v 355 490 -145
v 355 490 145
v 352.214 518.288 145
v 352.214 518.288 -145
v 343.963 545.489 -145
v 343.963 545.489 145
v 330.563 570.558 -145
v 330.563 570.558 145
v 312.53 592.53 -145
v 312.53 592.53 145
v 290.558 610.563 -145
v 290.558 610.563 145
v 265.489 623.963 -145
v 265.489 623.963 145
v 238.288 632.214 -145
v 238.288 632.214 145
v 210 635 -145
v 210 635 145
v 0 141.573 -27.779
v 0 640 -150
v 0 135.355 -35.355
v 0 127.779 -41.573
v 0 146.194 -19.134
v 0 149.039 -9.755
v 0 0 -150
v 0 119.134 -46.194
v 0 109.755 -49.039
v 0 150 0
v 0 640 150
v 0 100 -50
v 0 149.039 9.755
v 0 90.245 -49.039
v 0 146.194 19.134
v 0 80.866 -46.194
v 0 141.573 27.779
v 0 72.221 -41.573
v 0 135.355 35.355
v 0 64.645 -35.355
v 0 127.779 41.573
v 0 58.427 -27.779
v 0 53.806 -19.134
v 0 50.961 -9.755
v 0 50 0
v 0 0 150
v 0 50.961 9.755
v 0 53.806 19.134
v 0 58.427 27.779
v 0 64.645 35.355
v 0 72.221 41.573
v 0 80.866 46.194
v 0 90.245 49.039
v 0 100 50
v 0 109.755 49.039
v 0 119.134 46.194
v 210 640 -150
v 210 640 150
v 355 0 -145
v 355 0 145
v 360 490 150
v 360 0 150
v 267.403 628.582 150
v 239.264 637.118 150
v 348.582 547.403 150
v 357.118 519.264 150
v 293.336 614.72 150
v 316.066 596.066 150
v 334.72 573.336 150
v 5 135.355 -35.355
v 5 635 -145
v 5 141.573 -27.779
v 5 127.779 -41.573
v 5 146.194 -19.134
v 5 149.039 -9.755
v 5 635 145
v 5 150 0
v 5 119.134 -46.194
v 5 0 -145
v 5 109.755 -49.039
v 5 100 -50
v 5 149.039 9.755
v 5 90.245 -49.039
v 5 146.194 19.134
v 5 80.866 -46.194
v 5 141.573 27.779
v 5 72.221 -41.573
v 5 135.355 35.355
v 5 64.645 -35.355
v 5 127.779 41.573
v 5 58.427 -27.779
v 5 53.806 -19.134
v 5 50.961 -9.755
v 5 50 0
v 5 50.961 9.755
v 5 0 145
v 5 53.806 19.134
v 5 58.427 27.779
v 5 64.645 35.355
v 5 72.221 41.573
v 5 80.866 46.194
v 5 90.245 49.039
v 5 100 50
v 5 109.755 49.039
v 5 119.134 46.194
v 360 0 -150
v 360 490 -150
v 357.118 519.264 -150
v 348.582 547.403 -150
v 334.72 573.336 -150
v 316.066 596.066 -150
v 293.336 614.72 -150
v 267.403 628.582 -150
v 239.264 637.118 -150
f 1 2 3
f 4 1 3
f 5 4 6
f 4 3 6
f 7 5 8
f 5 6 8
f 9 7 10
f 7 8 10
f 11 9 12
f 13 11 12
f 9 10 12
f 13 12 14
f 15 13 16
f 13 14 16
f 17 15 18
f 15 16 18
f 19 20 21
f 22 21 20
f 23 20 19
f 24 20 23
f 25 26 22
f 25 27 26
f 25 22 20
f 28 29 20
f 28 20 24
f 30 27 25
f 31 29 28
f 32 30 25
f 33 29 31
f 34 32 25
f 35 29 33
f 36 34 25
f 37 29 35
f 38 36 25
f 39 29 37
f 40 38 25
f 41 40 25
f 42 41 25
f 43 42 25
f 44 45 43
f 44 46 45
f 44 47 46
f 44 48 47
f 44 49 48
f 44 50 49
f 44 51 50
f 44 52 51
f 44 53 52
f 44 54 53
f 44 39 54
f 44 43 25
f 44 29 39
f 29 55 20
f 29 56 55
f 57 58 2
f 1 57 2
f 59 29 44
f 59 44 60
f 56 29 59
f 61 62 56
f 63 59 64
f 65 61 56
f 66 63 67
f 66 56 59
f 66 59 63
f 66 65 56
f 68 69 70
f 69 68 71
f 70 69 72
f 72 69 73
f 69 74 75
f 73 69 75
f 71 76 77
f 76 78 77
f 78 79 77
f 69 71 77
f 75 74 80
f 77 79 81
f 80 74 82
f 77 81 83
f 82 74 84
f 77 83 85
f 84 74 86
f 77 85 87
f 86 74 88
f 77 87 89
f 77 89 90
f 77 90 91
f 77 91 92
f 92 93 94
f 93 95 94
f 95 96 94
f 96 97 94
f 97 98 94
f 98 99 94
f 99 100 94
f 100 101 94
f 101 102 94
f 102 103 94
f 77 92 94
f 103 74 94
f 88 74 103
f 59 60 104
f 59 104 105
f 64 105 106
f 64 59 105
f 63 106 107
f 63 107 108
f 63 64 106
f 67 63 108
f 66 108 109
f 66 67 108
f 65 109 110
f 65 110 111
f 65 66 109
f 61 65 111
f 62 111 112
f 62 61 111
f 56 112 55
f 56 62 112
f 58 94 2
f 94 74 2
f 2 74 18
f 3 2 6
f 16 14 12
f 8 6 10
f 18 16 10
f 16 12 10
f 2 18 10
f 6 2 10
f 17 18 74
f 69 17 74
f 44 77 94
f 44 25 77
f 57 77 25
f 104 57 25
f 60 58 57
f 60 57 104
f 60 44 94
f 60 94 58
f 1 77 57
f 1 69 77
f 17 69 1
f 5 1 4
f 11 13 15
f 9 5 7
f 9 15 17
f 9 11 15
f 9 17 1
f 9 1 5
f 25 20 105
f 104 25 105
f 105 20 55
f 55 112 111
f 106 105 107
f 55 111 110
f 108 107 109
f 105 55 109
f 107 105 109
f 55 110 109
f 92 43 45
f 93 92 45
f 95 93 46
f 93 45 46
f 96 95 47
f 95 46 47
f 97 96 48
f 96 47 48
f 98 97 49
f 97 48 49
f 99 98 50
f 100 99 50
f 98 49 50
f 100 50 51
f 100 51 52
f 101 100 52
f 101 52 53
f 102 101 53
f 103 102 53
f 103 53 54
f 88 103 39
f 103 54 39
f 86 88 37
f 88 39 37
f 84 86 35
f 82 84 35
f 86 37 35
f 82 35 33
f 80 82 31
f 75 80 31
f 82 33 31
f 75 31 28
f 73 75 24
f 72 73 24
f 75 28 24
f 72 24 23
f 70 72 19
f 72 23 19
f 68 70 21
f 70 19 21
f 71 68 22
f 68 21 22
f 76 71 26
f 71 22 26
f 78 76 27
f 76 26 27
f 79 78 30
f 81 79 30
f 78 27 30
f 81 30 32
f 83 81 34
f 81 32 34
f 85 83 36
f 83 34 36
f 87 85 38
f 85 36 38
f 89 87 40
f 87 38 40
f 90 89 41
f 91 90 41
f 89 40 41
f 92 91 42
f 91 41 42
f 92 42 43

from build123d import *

# Parameters (mm, degrees)
F1_DEPTH = 150
F3_T     = -5
F4_R     = 50
F5_DEPTH = 5


with BuildPart() as f1:
    # F0 (on Top) → F1 (new body)
    with BuildSketch(Plane.XY):
        with BuildLine():
            Line((0, 640), (0, 0))
            Line((0, 0), (360, 0))
            Line((360, 0), (360, 490))
            ThreePointArc((360, 490), (316.066017, 596.066017), (210, 640))
            Line((210, 640), (0, 640))
        make_face()
    extrude(amount=F1_DEPTH)

    # F2: F1 across plane


with BuildPart() as f1_1:
    add(f1.part)
    add(f1.part.mirror(Plane.XY))

    # F3
    f3_openings = [f1_1.faces().sort_by_distance(p)[0] for p in [
        (180, 0, 0),
    ]]
    offset(amount=F3_T, openings=f3_openings)

    # F4 (on face) → F5 (cut, through all)
    with BuildSketch(Plane(origin=(0, 0, 0), x_dir=(0, -1, 0), z_dir=(-1, 0, 0))):
        with Locations((-100, 0)):
            Circle(F4_R)
    extrude(amount=-F5_DEPTH, mode=Mode.SUBTRACT)


solid = f1_1.part
